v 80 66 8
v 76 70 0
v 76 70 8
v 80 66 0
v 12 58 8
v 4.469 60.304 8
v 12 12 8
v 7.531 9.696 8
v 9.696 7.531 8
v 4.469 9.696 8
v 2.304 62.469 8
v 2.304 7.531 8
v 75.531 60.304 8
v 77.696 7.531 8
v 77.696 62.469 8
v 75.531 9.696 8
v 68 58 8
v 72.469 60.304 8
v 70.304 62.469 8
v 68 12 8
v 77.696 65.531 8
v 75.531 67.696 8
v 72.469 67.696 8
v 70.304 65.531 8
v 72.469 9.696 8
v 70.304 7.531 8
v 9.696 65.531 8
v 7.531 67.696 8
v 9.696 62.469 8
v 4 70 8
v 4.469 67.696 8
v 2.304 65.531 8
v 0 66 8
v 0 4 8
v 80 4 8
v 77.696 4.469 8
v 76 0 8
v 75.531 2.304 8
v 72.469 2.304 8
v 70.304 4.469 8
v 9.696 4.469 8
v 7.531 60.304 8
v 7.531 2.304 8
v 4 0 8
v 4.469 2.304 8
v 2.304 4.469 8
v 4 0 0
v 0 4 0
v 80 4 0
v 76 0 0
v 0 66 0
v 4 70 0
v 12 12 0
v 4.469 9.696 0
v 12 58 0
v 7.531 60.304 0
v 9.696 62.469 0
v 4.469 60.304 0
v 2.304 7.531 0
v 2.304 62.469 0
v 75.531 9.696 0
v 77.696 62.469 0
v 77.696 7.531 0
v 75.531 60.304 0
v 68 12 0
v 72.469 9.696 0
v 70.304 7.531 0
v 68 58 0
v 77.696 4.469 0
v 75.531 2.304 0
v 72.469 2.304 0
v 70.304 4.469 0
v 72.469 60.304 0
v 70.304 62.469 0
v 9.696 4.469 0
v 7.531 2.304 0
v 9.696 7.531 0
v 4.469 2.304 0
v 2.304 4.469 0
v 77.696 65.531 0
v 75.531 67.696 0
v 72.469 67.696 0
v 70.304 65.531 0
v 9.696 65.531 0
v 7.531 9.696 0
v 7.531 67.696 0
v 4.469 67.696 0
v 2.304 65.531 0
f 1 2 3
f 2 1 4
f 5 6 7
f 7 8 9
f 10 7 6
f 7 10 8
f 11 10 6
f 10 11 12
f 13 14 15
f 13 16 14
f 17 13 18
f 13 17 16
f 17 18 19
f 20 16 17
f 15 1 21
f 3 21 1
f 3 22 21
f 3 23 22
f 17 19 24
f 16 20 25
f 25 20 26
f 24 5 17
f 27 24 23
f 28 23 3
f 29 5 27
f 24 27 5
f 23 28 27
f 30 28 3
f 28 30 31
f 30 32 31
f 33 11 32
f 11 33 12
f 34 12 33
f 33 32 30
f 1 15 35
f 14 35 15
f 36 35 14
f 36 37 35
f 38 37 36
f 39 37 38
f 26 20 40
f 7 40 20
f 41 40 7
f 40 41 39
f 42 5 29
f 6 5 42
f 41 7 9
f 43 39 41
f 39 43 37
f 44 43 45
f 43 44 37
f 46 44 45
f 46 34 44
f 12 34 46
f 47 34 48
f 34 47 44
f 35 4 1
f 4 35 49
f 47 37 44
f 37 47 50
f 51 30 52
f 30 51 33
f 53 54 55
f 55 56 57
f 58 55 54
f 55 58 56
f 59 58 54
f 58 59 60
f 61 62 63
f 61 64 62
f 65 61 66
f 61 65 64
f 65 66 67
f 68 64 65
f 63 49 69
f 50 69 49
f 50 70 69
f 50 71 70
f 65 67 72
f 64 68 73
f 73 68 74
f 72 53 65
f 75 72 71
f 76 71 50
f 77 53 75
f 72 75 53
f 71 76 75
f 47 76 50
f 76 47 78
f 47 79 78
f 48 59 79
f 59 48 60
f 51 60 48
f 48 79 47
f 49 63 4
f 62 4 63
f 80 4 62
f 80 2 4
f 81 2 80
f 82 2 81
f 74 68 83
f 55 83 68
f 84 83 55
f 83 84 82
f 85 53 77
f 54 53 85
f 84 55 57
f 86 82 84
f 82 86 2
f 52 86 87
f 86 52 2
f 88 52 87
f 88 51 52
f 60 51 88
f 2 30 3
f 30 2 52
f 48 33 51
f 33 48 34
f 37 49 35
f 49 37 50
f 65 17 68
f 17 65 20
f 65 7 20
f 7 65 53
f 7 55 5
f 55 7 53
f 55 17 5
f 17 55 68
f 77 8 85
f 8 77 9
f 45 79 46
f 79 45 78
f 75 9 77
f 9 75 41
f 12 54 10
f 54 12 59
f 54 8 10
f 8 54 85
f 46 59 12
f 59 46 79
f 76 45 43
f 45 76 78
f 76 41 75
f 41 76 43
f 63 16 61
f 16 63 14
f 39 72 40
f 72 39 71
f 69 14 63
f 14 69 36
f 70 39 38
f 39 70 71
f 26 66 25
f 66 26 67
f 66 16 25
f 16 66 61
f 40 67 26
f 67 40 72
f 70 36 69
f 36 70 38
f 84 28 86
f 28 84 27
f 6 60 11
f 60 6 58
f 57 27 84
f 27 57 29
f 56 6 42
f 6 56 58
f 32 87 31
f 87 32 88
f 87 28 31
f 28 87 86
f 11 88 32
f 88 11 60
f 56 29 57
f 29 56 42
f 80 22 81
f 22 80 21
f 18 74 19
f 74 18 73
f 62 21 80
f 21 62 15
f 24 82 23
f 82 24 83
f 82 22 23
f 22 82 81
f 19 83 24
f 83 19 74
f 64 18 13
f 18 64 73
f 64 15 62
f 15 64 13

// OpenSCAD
$fn = 32;

// ----------------------------------------------------------------------
// Frame plate: 80 x 70 frame, 12 mm rails
// ----------------------------------------------------------------------

// --- parameters (mm) ---
plate_l = 80;             // plate length, X
plate_w = 70;             // plate width, Y
plate_t = 8;              // plate thickness, Z (extrusion height)
corner_c = 4;             // corner chamfer
frame_bar = 12;           // frame rail width
bolt_r = 4;               // corner bolt window radius
bolt_inset = 6;           // bolt centre inset from the edges

win_l = plate_l - 2 * frame_bar;  // window length
win_w = plate_w - 2 * frame_bar;  // window width
bolt_d = 2 * bolt_r;  // corner hole diameter

profile = [[4, 0], [76, 0], [80, 4], [80, 66], [76, 70], [4, 70], [0, 66], [0, 4]];  // primary outline, 8 points, counter clockwise
void_1 = [[12, 12], [68, 12], [68, 58], [12, 58]];  // the window, 4 points
void_2 = [[9.696, 7.531], [7.531, 9.696], [4.469, 9.696], [2.304, 7.531], [2.304, 4.469], [4.469, 2.304], [7.531, 2.304], [9.696, 4.469]];  // corner bolt window, 8 points
void_3 = [[77.696, 7.531], [75.531, 9.696], [72.469, 9.696], [70.304, 7.531], [70.304, 4.469], [72.469, 2.304], [75.531, 2.304], [77.696, 4.469]];  // corner bolt window, 8 points
void_4 = [[9.696, 65.531], [7.531, 67.696], [4.469, 67.696], [2.304, 65.531], [2.304, 62.469], [4.469, 60.304], [7.531, 60.304], [9.696, 62.469]];  // corner bolt window, 8 points
void_5 = [[77.696, 65.531], [75.531, 67.696], [72.469, 67.696], [70.304, 65.531], [70.304, 62.469], [72.469, 60.304], [75.531, 60.304], [77.696, 62.469]];  // corner bolt window, 8 points

// --- the one profile operation ---
difference() {
  linear_extrude(height = plate_t) polygon(points = profile);
  translate([0, 0, -1])
    linear_extrude(height = plate_t + 2) polygon(points = void_1);
  translate([0, 0, -1])
    linear_extrude(height = plate_t + 2) polygon(points = void_2);
  translate([0, 0, -1])
    linear_extrude(height = plate_t + 2) polygon(points = void_3);
  translate([0, 0, -1])
    linear_extrude(height = plate_t + 2) polygon(points = void_4);
  translate([0, 0, -1])
    linear_extrude(height = plate_t + 2) polygon(points = void_5);
}
